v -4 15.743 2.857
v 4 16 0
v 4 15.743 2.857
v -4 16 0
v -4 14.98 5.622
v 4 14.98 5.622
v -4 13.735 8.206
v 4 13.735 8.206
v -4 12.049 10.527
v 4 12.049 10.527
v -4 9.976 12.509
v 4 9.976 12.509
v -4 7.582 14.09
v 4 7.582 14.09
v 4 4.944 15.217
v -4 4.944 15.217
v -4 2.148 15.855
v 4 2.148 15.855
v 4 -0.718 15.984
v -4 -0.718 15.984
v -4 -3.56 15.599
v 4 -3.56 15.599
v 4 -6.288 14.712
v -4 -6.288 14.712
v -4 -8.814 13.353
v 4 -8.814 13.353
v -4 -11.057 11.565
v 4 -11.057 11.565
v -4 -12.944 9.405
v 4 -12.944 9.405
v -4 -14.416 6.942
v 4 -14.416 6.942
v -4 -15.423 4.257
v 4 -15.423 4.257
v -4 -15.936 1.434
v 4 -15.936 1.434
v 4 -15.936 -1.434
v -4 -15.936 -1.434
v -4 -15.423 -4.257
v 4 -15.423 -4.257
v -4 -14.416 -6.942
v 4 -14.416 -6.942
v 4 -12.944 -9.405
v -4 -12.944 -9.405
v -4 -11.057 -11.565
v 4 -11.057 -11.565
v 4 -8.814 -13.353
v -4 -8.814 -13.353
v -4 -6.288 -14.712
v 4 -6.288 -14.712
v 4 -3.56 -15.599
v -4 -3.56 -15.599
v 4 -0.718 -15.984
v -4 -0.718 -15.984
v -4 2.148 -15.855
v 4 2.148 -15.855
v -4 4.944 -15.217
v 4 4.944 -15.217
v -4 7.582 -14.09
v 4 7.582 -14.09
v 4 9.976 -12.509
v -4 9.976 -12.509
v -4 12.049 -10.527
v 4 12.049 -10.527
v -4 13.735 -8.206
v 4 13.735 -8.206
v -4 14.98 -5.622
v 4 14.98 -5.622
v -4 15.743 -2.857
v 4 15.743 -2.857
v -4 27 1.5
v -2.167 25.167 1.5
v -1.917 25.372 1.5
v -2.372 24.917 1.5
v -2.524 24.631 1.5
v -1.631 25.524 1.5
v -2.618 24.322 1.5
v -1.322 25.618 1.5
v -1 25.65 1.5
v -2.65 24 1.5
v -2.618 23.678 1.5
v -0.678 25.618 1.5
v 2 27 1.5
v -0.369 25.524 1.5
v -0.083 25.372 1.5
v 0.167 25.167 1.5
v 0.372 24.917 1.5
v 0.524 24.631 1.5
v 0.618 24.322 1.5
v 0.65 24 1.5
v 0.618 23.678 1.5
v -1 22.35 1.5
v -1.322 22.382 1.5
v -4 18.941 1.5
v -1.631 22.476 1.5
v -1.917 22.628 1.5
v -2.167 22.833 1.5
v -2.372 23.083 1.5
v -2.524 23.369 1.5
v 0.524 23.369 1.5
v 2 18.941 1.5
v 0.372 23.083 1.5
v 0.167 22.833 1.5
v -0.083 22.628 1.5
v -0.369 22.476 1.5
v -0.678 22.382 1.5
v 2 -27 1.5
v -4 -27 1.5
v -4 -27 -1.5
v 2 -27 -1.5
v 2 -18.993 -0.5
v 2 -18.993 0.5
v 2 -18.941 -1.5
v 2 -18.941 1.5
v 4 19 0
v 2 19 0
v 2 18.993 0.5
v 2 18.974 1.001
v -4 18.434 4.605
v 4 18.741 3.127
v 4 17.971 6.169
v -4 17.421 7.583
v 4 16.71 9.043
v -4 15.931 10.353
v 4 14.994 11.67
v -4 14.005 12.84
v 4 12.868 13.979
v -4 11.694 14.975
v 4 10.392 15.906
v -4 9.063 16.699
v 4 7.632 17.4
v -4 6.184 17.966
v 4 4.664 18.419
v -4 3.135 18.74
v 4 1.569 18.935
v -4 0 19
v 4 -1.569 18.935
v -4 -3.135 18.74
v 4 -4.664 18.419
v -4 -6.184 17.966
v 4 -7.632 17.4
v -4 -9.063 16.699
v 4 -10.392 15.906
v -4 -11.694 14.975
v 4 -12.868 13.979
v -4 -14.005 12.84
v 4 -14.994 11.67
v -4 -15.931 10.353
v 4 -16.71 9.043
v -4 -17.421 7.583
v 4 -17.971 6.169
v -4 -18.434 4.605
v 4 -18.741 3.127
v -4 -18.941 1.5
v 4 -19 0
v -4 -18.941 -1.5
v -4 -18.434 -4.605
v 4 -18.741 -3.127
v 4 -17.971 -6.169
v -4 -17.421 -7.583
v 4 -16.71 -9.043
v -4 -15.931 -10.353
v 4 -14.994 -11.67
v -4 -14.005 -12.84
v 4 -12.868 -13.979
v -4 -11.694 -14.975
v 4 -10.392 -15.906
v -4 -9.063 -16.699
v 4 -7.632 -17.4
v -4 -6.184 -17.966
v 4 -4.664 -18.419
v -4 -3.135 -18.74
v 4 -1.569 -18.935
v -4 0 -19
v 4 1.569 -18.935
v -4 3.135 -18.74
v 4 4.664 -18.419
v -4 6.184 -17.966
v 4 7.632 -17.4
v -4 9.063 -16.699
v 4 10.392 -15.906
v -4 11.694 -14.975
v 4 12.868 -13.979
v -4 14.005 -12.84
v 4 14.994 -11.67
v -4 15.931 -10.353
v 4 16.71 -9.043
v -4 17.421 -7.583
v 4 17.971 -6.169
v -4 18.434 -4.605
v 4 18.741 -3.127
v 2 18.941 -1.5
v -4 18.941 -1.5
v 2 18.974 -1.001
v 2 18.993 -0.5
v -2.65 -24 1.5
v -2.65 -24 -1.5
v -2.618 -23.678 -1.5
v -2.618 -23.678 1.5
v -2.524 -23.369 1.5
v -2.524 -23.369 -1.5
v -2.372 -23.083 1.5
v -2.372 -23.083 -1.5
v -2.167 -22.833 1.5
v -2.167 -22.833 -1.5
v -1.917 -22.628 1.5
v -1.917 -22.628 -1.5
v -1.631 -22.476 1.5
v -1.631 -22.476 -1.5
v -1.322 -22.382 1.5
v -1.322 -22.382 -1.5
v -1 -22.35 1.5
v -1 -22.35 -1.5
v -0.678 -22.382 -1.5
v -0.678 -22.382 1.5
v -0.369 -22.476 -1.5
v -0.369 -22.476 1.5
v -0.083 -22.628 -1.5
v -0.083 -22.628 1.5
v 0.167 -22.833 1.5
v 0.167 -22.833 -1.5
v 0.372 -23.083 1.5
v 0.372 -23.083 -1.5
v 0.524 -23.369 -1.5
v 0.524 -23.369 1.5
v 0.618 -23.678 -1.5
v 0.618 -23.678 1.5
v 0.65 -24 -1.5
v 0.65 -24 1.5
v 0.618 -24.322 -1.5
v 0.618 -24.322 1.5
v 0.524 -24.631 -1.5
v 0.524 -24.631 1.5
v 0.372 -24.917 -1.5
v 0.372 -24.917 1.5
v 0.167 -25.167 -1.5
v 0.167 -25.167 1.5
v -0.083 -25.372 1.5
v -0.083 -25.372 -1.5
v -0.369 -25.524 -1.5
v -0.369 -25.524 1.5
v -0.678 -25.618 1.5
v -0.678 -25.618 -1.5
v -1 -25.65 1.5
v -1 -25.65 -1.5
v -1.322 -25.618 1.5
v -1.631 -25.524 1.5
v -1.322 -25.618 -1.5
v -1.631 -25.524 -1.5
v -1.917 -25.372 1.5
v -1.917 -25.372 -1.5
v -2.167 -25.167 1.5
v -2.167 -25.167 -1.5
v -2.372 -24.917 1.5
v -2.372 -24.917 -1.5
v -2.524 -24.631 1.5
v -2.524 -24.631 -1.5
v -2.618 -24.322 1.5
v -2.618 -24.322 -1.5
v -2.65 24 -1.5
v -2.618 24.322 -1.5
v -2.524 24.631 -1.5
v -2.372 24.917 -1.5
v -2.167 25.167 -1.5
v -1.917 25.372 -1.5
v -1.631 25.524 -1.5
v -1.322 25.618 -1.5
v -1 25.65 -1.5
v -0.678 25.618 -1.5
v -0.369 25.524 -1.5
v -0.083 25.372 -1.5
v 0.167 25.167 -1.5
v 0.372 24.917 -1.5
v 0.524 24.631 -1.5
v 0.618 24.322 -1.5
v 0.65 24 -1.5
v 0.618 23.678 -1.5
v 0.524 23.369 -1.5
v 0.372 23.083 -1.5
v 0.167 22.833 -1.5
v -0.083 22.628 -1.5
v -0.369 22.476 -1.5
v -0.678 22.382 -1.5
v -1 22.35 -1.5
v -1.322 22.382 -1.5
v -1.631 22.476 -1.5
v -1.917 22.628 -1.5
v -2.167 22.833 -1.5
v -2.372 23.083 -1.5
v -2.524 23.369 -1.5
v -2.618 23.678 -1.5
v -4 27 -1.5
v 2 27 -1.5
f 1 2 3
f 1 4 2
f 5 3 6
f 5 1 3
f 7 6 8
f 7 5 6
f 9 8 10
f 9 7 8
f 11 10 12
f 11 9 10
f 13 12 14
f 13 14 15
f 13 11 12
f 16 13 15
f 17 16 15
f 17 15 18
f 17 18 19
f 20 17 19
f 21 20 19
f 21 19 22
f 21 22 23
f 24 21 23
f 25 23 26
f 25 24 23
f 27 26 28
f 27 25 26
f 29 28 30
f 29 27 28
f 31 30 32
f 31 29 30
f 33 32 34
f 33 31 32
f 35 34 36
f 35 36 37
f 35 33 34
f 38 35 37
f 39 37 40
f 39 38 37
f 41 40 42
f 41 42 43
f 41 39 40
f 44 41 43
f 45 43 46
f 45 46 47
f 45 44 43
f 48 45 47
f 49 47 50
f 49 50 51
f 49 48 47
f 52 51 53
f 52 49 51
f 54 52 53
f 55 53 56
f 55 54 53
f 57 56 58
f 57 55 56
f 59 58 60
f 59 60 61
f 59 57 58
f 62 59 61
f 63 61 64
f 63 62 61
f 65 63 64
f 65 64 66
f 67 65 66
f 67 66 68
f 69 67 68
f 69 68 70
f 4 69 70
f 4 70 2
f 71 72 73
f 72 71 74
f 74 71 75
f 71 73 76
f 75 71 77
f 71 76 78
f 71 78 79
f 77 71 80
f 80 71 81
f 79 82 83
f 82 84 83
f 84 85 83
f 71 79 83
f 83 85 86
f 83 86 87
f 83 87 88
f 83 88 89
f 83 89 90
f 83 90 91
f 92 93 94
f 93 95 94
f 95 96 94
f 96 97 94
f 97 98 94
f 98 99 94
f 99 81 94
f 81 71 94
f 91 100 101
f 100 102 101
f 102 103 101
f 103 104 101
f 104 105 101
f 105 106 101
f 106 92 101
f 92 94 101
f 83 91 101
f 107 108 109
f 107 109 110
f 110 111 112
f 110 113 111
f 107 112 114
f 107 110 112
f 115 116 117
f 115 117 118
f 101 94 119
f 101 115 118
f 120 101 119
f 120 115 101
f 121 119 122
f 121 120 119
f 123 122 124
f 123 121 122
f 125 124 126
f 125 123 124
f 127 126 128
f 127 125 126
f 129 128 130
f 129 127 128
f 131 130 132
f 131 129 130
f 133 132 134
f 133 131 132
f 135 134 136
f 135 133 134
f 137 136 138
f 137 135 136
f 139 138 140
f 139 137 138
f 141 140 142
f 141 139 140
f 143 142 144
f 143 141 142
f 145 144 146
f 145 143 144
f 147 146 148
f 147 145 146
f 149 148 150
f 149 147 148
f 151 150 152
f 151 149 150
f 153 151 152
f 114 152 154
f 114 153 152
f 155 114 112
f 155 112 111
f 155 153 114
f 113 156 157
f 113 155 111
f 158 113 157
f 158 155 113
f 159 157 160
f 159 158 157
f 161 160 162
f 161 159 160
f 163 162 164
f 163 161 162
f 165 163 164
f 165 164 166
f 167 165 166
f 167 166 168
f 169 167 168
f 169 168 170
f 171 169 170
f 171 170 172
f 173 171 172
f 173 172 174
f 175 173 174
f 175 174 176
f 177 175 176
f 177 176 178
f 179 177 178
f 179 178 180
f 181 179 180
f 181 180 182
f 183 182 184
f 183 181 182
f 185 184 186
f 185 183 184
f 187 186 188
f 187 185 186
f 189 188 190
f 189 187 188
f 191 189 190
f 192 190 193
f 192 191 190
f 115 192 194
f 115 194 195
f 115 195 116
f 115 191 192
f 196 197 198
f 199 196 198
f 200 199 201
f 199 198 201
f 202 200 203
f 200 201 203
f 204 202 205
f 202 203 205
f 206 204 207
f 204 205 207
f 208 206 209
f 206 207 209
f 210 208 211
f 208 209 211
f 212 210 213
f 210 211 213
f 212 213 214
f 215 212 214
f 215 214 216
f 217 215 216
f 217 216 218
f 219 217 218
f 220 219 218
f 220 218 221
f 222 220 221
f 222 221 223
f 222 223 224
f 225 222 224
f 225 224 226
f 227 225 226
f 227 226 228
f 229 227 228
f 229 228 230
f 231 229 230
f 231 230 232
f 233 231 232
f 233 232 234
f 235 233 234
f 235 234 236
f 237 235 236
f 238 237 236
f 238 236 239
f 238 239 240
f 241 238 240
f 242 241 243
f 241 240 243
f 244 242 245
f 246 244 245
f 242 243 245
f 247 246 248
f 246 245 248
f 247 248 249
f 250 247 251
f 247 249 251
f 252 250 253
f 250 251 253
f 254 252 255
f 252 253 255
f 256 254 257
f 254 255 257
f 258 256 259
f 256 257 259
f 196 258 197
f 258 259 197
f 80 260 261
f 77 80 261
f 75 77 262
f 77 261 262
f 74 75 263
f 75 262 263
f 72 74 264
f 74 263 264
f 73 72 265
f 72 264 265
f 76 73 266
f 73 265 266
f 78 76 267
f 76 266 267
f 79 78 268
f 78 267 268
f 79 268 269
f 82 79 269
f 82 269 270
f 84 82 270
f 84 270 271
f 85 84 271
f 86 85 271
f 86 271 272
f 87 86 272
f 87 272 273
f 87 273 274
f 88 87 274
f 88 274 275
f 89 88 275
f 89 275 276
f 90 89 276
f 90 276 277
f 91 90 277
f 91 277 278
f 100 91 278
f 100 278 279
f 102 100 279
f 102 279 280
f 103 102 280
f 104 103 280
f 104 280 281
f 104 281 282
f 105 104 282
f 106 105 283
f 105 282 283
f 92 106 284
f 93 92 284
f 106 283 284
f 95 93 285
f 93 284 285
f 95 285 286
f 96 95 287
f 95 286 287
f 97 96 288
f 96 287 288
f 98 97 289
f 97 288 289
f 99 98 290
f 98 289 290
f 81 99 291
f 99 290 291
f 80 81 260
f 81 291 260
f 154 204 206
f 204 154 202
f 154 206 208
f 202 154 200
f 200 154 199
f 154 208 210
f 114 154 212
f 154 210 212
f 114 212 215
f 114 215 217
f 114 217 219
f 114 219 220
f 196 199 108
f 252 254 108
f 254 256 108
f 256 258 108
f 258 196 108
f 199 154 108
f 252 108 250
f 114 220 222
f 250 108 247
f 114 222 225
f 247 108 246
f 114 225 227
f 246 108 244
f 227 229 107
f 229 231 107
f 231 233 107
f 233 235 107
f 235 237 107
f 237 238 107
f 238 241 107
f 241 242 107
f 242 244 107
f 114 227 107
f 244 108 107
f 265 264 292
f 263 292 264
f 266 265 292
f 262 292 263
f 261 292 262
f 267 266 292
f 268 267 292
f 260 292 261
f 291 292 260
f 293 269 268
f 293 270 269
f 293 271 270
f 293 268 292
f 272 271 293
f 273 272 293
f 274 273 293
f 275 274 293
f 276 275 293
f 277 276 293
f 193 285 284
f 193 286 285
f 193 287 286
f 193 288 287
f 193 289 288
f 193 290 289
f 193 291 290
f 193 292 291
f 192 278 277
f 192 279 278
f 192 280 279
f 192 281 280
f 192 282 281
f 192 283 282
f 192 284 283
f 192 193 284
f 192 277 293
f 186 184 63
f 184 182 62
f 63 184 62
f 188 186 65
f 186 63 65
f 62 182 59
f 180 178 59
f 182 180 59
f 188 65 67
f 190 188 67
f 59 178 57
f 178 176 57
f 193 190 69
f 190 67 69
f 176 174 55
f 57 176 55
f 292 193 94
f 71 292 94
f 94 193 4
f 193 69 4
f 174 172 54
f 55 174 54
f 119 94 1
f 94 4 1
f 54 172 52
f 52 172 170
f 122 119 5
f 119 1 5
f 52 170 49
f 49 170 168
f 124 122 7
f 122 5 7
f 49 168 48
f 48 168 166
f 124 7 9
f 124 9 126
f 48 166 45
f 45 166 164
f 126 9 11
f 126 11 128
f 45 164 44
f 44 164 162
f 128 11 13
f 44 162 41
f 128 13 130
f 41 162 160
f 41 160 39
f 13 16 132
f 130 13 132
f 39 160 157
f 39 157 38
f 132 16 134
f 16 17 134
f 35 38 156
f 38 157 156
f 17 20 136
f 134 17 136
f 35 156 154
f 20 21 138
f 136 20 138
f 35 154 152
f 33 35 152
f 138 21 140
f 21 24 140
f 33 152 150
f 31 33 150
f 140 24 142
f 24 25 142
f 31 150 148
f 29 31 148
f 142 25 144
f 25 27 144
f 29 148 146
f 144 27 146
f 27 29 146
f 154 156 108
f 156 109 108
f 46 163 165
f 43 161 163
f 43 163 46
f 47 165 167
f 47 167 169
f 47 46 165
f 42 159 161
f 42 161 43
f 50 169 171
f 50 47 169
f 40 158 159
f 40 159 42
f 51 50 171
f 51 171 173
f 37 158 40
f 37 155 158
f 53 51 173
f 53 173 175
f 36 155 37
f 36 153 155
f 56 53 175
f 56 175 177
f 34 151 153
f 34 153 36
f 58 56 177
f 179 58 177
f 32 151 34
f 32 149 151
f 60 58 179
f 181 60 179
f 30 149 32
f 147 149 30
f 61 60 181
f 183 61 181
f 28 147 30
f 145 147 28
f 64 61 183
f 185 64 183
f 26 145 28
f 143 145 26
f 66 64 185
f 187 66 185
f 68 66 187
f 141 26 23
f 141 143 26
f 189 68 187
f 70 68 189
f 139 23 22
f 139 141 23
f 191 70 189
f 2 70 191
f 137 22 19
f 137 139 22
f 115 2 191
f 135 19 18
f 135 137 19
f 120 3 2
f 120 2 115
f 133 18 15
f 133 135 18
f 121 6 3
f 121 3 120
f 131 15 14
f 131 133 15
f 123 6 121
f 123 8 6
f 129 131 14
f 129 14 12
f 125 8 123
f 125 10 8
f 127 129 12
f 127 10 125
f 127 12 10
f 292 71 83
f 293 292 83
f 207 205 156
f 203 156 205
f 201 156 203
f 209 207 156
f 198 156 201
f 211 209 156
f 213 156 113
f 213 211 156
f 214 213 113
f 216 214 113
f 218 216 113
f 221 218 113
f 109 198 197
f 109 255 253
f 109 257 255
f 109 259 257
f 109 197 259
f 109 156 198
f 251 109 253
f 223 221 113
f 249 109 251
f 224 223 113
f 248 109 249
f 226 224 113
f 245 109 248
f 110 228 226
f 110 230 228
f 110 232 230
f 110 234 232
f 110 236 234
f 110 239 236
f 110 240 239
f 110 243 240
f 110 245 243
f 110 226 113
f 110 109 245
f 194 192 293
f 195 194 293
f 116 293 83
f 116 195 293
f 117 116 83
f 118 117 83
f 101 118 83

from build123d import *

# Parameters (mm, degrees)
F0_R     = 19
F0_R_2   = 16
F1_DEPTH = 4
F2_W     = 6
F2_H     = 3
F3_DEPTH = 27
F5_DEPTH = 4
F6_D     = 3.3
F6_DEPTH = 7
F6_TIP   = 0.9914200214


with BuildPart() as f1:
    # F0 (on Right) → F1 (new body, symmetric)
    with BuildSketch(Plane.YZ):
        Circle(F0_R)
        Circle(F0_R_2, mode=Mode.SUBTRACT)
    extrude(amount=F1_DEPTH, both=True)

    # F2 (on Front) → F3 (join, symmetric)
    with BuildSketch(Plane.XZ):
        with Locations((-1, 0)):
            Rectangle(F2_W, F2_H)
    extrude(amount=F3_DEPTH, both=True)

    # F0 (on Right) → F5 (cut, symmetric)
    with BuildSketch(Plane.YZ):
        Circle(F0_R_2)
    extrude(amount=F5_DEPTH, both=True, mode=Mode.SUBTRACT)

    # F6
    with Locations(Plane.XY.offset(1.5)):
        with Locations((-1, 24), (-1, -24)):
            Hole(F6_D / 2, depth=F6_DEPTH)
            with Locations((0, 0, -(F6_DEPTH + F6_TIP / 2))):  # 118° drill point
                Cone(0, F6_D / 2, F6_TIP, mode=Mode.SUBTRACT)


solid = f1.part
